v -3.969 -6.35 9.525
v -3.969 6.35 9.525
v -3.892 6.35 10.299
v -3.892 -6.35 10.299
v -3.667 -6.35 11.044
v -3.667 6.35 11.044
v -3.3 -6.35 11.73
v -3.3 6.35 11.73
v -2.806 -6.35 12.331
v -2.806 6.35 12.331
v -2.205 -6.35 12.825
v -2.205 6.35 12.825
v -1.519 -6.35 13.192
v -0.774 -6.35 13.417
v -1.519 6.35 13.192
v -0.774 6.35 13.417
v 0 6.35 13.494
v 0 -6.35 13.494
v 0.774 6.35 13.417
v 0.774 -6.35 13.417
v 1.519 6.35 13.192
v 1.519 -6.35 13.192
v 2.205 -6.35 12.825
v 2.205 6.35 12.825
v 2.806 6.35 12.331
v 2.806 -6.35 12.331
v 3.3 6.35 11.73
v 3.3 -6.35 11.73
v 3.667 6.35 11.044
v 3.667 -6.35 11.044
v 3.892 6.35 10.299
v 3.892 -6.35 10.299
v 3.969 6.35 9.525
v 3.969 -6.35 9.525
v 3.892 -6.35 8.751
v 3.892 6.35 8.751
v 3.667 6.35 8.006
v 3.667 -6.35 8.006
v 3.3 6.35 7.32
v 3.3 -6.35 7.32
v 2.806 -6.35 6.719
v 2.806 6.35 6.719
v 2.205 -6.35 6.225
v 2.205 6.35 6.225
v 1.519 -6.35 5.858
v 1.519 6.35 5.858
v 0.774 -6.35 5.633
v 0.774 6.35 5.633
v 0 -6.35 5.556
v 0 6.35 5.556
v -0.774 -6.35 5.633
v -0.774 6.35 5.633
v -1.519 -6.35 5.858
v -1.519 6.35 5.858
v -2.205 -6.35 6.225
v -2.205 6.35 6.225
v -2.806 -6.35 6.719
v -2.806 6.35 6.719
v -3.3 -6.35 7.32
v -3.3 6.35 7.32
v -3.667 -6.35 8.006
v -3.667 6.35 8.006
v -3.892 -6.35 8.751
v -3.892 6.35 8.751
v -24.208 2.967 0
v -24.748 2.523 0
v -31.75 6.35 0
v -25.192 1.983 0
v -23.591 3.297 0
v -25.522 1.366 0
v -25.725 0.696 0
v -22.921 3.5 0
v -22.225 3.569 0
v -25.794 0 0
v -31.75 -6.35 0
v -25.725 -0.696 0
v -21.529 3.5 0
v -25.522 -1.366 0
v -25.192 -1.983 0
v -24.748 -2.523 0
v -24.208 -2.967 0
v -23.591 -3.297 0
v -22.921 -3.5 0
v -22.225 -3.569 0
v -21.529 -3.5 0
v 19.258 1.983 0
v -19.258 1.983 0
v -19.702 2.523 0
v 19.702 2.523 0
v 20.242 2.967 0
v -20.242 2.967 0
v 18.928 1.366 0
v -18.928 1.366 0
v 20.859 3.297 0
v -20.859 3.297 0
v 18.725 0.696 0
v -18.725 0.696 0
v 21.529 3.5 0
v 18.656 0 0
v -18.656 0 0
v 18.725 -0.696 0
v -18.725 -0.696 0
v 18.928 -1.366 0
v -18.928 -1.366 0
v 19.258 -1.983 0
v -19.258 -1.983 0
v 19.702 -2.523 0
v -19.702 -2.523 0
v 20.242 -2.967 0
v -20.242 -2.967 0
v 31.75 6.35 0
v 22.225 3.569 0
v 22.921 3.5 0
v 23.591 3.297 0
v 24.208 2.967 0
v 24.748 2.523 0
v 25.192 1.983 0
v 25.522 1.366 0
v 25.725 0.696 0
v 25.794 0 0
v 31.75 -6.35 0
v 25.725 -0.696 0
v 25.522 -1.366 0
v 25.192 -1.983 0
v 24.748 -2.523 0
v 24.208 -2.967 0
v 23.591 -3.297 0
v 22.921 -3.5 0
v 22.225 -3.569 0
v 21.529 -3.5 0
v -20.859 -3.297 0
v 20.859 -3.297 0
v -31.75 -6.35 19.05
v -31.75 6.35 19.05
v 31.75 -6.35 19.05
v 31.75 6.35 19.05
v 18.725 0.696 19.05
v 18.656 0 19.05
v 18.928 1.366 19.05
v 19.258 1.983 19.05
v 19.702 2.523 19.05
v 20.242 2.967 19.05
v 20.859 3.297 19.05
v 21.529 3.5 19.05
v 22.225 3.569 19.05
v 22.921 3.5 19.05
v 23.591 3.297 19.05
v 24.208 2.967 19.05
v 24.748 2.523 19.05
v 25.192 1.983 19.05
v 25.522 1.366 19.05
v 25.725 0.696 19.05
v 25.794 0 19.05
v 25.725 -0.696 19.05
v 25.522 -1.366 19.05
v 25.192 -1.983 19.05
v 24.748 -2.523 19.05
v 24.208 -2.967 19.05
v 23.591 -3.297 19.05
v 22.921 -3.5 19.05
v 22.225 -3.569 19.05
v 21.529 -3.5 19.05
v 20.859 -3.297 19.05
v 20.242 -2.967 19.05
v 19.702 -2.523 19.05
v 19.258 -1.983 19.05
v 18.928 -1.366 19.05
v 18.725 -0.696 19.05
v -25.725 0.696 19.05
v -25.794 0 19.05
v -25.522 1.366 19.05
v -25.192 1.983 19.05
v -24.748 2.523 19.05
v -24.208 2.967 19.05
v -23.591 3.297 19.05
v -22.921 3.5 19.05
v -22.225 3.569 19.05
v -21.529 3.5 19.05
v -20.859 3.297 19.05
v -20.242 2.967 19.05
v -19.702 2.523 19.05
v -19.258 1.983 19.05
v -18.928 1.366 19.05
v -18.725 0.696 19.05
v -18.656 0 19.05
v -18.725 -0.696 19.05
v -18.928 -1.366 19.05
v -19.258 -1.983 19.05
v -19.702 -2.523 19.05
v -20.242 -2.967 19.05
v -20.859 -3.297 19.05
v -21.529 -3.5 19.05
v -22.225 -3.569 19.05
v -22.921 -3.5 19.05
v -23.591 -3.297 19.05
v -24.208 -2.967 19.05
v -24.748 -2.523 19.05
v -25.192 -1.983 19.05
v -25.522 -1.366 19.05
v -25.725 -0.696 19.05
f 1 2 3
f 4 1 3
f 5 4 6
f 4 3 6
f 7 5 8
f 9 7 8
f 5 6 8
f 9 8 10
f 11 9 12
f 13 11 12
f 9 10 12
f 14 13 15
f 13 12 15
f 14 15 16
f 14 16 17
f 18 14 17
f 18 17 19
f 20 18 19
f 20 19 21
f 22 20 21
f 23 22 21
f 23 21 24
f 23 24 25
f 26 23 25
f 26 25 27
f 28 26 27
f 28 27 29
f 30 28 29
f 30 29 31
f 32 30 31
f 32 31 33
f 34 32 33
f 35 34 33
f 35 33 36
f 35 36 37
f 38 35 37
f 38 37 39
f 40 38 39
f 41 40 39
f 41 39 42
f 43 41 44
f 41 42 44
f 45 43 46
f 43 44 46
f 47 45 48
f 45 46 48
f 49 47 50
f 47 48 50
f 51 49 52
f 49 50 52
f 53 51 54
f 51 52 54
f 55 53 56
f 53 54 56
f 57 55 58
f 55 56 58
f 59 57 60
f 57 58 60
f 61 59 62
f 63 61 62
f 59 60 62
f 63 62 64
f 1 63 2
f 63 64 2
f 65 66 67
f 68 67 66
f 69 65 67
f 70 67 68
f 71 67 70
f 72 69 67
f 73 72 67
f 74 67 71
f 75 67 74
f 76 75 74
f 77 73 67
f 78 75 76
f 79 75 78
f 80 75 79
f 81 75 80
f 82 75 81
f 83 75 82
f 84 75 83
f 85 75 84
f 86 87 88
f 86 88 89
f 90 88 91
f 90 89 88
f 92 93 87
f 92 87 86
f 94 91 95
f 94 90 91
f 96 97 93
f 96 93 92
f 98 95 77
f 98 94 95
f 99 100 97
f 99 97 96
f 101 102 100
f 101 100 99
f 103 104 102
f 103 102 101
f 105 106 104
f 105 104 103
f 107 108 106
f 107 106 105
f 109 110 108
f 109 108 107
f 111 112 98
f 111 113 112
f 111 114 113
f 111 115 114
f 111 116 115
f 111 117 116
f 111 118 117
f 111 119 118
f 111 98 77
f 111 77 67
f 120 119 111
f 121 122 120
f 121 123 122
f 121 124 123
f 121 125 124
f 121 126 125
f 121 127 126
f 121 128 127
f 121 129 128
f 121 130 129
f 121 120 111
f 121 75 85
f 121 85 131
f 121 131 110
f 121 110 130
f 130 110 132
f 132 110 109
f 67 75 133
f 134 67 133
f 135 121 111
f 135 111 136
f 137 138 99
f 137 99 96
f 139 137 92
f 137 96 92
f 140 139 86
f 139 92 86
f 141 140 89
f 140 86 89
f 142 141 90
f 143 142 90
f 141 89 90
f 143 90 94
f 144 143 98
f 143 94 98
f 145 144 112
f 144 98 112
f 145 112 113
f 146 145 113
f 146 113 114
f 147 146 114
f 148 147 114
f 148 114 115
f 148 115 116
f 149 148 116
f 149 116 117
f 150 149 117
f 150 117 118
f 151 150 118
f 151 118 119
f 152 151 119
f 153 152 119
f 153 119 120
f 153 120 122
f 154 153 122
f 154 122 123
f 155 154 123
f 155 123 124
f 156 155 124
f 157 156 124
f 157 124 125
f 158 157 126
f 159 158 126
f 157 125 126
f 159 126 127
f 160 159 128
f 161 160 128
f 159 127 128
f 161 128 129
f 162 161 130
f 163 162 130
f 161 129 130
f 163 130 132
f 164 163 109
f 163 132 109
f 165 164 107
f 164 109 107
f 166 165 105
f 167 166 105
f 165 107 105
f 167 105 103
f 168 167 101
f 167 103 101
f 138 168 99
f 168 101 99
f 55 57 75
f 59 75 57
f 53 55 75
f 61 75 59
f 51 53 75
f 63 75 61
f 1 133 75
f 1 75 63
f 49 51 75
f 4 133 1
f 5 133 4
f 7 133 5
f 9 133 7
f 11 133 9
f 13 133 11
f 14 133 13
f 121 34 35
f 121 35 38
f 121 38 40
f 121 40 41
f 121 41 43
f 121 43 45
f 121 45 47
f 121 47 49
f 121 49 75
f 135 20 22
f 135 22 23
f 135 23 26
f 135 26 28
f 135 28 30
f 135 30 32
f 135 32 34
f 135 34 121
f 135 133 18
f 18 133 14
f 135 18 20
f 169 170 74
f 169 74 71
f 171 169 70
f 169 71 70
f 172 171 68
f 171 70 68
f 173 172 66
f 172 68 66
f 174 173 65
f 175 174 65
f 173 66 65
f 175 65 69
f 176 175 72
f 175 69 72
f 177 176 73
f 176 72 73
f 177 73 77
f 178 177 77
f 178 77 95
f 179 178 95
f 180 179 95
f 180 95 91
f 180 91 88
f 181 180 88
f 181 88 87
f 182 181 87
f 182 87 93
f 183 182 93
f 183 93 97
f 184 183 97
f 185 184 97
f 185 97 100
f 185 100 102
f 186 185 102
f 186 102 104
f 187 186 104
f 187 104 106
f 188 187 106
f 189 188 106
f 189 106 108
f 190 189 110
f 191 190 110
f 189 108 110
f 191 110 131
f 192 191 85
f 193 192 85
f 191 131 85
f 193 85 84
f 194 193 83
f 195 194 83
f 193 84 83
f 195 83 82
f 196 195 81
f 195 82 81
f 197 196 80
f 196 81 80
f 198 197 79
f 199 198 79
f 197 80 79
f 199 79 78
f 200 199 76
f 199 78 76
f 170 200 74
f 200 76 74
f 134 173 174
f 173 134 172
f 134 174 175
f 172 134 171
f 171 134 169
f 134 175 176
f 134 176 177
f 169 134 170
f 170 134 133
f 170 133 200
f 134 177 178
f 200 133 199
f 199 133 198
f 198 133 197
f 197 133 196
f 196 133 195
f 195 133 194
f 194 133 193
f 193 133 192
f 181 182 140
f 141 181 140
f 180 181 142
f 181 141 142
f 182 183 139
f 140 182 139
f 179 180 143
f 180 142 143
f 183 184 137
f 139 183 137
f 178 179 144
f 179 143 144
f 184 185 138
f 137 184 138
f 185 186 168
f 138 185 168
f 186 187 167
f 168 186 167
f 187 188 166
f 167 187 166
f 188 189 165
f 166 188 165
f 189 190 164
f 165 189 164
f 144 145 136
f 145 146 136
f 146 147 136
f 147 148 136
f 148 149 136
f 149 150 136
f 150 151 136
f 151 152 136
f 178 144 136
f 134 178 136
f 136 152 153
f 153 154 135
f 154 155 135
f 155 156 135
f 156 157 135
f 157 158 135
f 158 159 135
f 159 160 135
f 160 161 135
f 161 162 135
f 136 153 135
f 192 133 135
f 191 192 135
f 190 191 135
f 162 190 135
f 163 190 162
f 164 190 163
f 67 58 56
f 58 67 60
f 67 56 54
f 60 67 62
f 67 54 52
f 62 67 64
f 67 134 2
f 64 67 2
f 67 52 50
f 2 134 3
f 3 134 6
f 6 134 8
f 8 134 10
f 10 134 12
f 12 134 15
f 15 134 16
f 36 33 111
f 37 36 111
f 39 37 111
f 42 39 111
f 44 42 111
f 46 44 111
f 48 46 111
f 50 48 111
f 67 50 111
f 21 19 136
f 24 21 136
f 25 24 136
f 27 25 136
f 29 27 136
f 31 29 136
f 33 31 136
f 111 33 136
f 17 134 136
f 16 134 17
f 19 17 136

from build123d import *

# Parameters (mm, degrees)
F0_W     = 63.5
F0_H     = 19.05
F1_DEPTH = 6.35
F4_D     = 7.9375
F5_D     = 7.1374


with BuildPart() as f1:
    # F0 (on Front) → F1 (new body, symmetric)
    with BuildSketch(Plane.XZ):
        with Locations((0, 9.525)):
            Rectangle(F0_W, F0_H)
    extrude(amount=F1_DEPTH, both=True)

    # F4 (through all)
    with Locations(Plane.XZ.offset(6.35)):
        with Locations((0, 9.525)):
            Hole(F4_D / 2)

    # F5 (through all)
    with Locations(Plane.XY.offset(19.05)):
        with Locations((-22.225, 0), (22.225, 0)):
            Hole(F5_D / 2)


solid = f1.part
